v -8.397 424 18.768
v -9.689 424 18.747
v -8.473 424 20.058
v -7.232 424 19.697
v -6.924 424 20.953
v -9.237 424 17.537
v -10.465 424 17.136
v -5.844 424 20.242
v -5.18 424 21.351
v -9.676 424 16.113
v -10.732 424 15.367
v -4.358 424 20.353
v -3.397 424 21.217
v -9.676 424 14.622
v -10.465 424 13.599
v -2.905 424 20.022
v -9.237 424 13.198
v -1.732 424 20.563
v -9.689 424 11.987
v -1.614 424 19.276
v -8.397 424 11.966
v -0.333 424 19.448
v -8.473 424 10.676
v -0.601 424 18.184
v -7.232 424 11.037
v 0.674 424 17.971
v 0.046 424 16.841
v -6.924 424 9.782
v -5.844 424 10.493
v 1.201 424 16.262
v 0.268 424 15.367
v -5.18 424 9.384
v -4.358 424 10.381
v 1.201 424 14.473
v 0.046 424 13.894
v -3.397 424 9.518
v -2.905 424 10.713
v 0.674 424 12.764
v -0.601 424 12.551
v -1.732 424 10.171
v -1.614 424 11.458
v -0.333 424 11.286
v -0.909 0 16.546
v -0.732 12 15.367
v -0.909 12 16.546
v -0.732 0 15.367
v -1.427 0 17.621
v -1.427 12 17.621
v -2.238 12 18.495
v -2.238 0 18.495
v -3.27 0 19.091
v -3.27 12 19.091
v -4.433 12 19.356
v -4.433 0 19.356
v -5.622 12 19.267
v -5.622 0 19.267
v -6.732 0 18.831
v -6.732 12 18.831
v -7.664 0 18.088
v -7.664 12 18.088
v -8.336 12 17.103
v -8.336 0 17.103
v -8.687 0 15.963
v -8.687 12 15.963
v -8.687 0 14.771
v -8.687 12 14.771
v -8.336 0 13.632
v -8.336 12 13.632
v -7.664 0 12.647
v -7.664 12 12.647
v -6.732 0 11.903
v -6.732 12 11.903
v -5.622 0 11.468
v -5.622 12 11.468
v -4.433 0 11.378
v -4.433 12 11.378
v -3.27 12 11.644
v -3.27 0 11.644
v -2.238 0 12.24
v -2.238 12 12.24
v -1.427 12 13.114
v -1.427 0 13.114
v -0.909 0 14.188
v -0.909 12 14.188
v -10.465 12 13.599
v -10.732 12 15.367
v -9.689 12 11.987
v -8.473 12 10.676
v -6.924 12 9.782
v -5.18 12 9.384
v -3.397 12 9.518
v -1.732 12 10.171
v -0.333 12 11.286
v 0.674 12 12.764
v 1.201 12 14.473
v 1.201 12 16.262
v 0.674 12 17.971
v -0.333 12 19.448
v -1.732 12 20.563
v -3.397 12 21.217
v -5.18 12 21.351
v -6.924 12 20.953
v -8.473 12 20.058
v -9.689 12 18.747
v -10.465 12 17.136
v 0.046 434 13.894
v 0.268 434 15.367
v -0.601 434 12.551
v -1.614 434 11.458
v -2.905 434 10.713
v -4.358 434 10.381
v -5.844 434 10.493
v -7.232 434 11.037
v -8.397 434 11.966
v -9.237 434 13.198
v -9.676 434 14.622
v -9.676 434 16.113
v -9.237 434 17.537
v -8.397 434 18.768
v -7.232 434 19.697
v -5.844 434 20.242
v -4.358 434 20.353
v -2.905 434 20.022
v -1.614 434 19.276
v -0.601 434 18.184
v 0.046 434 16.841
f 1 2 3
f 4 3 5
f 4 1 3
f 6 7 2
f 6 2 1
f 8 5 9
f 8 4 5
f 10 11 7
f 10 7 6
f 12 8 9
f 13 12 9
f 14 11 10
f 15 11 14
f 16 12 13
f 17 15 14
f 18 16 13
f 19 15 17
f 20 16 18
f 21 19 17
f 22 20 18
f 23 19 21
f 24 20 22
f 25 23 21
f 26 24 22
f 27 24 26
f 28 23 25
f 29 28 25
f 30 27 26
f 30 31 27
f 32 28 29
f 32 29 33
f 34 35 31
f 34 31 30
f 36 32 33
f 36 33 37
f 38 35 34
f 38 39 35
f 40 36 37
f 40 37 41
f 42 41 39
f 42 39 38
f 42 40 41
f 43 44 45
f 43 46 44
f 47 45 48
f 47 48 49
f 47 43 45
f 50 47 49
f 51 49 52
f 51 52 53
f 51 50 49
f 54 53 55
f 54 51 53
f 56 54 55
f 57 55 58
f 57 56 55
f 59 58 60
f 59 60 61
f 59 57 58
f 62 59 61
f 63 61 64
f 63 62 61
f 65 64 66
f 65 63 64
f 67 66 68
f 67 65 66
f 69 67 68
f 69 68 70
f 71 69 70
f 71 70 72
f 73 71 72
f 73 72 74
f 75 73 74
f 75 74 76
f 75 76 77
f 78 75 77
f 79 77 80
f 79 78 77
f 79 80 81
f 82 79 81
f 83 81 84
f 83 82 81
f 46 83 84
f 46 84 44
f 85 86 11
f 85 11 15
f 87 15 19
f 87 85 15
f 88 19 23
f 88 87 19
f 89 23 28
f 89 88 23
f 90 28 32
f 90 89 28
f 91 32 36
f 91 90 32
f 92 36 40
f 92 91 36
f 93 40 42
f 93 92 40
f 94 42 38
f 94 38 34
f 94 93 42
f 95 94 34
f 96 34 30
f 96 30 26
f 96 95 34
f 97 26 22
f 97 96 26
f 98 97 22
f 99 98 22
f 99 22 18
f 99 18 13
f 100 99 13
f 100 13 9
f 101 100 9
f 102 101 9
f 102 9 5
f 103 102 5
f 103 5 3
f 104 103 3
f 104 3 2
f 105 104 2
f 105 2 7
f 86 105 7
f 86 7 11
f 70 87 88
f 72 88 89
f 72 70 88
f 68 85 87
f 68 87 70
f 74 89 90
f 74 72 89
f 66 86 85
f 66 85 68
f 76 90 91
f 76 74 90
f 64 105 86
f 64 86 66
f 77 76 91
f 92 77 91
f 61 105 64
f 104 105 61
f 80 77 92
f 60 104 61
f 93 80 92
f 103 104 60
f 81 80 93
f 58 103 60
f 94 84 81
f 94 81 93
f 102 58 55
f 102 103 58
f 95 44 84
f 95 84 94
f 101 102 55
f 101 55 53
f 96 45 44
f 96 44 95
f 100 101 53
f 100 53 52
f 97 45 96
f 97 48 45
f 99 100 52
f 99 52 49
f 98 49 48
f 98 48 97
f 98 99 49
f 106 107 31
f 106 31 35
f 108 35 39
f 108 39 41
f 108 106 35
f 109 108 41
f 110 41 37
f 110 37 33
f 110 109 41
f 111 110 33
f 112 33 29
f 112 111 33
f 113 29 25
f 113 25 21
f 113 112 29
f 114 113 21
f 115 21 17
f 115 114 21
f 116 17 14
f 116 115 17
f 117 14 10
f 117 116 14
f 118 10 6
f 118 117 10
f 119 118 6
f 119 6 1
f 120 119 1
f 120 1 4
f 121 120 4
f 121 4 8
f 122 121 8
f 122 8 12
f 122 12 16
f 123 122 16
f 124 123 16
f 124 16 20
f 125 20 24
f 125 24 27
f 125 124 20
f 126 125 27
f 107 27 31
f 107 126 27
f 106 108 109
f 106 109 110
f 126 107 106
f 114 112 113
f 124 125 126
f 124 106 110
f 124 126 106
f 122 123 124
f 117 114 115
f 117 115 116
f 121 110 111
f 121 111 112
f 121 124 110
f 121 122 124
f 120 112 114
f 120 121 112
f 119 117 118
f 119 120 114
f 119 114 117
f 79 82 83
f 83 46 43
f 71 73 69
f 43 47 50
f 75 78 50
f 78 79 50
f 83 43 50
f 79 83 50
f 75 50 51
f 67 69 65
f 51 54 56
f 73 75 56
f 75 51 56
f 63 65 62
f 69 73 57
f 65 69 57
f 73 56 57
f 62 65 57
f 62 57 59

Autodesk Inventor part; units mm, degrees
ref_plane "YZ Plane" through (0, 0, 0) normal (1, 0, 0) x (0, 1, 0)
ref_plane "XZ Plane" through (0, 0, 0) normal (0, 1, 0) x (-1, 0, 0)
ref_plane "XY Plane" through (0, 0, 0) normal (0, 0, 1) x (1, 0, 0)
sketch "Boceto1" plane through (0, 0, 0) normal (0, 1, 0) x (-1, 0, 0)
  circle A0 centre (4.7317, 15.3673) radius 6
  point P0 (0, 0)
  dimension "d0" = 12
extrude "Extrusión1" add sketch "Boceto1" along normal blind 434
thread "Rosca1" size "M12x1.5" class "6g" standard "ANSI Metric M Profile" length 430
sketch "Sketch2" plane through (-4.7317, 0, 15.3673) normal (0, -1, 0) x (1, 0, 0)
  circle A0 centre (0, 0) radius 4
  circle A1 centre (0, 0) radius 6
  dimension "d5" = 8
extrude "Extrusion2" cut sketch "Sketch2" against normal blind 12
sketch "Sketch3" plane through (-4.7317, 434, 15.3673) normal (0, 1, 0) x (1, 0, 0)
  circle A0 centre (0, 0) radius 5
  circle A1 centre (0, 0) radius 6
  dimension "d8" = 10
extrude "Extrusion3" cut sketch "Sketch3" against normal blind 10
properties part number "Tornillo de mesa" material "Steel"
